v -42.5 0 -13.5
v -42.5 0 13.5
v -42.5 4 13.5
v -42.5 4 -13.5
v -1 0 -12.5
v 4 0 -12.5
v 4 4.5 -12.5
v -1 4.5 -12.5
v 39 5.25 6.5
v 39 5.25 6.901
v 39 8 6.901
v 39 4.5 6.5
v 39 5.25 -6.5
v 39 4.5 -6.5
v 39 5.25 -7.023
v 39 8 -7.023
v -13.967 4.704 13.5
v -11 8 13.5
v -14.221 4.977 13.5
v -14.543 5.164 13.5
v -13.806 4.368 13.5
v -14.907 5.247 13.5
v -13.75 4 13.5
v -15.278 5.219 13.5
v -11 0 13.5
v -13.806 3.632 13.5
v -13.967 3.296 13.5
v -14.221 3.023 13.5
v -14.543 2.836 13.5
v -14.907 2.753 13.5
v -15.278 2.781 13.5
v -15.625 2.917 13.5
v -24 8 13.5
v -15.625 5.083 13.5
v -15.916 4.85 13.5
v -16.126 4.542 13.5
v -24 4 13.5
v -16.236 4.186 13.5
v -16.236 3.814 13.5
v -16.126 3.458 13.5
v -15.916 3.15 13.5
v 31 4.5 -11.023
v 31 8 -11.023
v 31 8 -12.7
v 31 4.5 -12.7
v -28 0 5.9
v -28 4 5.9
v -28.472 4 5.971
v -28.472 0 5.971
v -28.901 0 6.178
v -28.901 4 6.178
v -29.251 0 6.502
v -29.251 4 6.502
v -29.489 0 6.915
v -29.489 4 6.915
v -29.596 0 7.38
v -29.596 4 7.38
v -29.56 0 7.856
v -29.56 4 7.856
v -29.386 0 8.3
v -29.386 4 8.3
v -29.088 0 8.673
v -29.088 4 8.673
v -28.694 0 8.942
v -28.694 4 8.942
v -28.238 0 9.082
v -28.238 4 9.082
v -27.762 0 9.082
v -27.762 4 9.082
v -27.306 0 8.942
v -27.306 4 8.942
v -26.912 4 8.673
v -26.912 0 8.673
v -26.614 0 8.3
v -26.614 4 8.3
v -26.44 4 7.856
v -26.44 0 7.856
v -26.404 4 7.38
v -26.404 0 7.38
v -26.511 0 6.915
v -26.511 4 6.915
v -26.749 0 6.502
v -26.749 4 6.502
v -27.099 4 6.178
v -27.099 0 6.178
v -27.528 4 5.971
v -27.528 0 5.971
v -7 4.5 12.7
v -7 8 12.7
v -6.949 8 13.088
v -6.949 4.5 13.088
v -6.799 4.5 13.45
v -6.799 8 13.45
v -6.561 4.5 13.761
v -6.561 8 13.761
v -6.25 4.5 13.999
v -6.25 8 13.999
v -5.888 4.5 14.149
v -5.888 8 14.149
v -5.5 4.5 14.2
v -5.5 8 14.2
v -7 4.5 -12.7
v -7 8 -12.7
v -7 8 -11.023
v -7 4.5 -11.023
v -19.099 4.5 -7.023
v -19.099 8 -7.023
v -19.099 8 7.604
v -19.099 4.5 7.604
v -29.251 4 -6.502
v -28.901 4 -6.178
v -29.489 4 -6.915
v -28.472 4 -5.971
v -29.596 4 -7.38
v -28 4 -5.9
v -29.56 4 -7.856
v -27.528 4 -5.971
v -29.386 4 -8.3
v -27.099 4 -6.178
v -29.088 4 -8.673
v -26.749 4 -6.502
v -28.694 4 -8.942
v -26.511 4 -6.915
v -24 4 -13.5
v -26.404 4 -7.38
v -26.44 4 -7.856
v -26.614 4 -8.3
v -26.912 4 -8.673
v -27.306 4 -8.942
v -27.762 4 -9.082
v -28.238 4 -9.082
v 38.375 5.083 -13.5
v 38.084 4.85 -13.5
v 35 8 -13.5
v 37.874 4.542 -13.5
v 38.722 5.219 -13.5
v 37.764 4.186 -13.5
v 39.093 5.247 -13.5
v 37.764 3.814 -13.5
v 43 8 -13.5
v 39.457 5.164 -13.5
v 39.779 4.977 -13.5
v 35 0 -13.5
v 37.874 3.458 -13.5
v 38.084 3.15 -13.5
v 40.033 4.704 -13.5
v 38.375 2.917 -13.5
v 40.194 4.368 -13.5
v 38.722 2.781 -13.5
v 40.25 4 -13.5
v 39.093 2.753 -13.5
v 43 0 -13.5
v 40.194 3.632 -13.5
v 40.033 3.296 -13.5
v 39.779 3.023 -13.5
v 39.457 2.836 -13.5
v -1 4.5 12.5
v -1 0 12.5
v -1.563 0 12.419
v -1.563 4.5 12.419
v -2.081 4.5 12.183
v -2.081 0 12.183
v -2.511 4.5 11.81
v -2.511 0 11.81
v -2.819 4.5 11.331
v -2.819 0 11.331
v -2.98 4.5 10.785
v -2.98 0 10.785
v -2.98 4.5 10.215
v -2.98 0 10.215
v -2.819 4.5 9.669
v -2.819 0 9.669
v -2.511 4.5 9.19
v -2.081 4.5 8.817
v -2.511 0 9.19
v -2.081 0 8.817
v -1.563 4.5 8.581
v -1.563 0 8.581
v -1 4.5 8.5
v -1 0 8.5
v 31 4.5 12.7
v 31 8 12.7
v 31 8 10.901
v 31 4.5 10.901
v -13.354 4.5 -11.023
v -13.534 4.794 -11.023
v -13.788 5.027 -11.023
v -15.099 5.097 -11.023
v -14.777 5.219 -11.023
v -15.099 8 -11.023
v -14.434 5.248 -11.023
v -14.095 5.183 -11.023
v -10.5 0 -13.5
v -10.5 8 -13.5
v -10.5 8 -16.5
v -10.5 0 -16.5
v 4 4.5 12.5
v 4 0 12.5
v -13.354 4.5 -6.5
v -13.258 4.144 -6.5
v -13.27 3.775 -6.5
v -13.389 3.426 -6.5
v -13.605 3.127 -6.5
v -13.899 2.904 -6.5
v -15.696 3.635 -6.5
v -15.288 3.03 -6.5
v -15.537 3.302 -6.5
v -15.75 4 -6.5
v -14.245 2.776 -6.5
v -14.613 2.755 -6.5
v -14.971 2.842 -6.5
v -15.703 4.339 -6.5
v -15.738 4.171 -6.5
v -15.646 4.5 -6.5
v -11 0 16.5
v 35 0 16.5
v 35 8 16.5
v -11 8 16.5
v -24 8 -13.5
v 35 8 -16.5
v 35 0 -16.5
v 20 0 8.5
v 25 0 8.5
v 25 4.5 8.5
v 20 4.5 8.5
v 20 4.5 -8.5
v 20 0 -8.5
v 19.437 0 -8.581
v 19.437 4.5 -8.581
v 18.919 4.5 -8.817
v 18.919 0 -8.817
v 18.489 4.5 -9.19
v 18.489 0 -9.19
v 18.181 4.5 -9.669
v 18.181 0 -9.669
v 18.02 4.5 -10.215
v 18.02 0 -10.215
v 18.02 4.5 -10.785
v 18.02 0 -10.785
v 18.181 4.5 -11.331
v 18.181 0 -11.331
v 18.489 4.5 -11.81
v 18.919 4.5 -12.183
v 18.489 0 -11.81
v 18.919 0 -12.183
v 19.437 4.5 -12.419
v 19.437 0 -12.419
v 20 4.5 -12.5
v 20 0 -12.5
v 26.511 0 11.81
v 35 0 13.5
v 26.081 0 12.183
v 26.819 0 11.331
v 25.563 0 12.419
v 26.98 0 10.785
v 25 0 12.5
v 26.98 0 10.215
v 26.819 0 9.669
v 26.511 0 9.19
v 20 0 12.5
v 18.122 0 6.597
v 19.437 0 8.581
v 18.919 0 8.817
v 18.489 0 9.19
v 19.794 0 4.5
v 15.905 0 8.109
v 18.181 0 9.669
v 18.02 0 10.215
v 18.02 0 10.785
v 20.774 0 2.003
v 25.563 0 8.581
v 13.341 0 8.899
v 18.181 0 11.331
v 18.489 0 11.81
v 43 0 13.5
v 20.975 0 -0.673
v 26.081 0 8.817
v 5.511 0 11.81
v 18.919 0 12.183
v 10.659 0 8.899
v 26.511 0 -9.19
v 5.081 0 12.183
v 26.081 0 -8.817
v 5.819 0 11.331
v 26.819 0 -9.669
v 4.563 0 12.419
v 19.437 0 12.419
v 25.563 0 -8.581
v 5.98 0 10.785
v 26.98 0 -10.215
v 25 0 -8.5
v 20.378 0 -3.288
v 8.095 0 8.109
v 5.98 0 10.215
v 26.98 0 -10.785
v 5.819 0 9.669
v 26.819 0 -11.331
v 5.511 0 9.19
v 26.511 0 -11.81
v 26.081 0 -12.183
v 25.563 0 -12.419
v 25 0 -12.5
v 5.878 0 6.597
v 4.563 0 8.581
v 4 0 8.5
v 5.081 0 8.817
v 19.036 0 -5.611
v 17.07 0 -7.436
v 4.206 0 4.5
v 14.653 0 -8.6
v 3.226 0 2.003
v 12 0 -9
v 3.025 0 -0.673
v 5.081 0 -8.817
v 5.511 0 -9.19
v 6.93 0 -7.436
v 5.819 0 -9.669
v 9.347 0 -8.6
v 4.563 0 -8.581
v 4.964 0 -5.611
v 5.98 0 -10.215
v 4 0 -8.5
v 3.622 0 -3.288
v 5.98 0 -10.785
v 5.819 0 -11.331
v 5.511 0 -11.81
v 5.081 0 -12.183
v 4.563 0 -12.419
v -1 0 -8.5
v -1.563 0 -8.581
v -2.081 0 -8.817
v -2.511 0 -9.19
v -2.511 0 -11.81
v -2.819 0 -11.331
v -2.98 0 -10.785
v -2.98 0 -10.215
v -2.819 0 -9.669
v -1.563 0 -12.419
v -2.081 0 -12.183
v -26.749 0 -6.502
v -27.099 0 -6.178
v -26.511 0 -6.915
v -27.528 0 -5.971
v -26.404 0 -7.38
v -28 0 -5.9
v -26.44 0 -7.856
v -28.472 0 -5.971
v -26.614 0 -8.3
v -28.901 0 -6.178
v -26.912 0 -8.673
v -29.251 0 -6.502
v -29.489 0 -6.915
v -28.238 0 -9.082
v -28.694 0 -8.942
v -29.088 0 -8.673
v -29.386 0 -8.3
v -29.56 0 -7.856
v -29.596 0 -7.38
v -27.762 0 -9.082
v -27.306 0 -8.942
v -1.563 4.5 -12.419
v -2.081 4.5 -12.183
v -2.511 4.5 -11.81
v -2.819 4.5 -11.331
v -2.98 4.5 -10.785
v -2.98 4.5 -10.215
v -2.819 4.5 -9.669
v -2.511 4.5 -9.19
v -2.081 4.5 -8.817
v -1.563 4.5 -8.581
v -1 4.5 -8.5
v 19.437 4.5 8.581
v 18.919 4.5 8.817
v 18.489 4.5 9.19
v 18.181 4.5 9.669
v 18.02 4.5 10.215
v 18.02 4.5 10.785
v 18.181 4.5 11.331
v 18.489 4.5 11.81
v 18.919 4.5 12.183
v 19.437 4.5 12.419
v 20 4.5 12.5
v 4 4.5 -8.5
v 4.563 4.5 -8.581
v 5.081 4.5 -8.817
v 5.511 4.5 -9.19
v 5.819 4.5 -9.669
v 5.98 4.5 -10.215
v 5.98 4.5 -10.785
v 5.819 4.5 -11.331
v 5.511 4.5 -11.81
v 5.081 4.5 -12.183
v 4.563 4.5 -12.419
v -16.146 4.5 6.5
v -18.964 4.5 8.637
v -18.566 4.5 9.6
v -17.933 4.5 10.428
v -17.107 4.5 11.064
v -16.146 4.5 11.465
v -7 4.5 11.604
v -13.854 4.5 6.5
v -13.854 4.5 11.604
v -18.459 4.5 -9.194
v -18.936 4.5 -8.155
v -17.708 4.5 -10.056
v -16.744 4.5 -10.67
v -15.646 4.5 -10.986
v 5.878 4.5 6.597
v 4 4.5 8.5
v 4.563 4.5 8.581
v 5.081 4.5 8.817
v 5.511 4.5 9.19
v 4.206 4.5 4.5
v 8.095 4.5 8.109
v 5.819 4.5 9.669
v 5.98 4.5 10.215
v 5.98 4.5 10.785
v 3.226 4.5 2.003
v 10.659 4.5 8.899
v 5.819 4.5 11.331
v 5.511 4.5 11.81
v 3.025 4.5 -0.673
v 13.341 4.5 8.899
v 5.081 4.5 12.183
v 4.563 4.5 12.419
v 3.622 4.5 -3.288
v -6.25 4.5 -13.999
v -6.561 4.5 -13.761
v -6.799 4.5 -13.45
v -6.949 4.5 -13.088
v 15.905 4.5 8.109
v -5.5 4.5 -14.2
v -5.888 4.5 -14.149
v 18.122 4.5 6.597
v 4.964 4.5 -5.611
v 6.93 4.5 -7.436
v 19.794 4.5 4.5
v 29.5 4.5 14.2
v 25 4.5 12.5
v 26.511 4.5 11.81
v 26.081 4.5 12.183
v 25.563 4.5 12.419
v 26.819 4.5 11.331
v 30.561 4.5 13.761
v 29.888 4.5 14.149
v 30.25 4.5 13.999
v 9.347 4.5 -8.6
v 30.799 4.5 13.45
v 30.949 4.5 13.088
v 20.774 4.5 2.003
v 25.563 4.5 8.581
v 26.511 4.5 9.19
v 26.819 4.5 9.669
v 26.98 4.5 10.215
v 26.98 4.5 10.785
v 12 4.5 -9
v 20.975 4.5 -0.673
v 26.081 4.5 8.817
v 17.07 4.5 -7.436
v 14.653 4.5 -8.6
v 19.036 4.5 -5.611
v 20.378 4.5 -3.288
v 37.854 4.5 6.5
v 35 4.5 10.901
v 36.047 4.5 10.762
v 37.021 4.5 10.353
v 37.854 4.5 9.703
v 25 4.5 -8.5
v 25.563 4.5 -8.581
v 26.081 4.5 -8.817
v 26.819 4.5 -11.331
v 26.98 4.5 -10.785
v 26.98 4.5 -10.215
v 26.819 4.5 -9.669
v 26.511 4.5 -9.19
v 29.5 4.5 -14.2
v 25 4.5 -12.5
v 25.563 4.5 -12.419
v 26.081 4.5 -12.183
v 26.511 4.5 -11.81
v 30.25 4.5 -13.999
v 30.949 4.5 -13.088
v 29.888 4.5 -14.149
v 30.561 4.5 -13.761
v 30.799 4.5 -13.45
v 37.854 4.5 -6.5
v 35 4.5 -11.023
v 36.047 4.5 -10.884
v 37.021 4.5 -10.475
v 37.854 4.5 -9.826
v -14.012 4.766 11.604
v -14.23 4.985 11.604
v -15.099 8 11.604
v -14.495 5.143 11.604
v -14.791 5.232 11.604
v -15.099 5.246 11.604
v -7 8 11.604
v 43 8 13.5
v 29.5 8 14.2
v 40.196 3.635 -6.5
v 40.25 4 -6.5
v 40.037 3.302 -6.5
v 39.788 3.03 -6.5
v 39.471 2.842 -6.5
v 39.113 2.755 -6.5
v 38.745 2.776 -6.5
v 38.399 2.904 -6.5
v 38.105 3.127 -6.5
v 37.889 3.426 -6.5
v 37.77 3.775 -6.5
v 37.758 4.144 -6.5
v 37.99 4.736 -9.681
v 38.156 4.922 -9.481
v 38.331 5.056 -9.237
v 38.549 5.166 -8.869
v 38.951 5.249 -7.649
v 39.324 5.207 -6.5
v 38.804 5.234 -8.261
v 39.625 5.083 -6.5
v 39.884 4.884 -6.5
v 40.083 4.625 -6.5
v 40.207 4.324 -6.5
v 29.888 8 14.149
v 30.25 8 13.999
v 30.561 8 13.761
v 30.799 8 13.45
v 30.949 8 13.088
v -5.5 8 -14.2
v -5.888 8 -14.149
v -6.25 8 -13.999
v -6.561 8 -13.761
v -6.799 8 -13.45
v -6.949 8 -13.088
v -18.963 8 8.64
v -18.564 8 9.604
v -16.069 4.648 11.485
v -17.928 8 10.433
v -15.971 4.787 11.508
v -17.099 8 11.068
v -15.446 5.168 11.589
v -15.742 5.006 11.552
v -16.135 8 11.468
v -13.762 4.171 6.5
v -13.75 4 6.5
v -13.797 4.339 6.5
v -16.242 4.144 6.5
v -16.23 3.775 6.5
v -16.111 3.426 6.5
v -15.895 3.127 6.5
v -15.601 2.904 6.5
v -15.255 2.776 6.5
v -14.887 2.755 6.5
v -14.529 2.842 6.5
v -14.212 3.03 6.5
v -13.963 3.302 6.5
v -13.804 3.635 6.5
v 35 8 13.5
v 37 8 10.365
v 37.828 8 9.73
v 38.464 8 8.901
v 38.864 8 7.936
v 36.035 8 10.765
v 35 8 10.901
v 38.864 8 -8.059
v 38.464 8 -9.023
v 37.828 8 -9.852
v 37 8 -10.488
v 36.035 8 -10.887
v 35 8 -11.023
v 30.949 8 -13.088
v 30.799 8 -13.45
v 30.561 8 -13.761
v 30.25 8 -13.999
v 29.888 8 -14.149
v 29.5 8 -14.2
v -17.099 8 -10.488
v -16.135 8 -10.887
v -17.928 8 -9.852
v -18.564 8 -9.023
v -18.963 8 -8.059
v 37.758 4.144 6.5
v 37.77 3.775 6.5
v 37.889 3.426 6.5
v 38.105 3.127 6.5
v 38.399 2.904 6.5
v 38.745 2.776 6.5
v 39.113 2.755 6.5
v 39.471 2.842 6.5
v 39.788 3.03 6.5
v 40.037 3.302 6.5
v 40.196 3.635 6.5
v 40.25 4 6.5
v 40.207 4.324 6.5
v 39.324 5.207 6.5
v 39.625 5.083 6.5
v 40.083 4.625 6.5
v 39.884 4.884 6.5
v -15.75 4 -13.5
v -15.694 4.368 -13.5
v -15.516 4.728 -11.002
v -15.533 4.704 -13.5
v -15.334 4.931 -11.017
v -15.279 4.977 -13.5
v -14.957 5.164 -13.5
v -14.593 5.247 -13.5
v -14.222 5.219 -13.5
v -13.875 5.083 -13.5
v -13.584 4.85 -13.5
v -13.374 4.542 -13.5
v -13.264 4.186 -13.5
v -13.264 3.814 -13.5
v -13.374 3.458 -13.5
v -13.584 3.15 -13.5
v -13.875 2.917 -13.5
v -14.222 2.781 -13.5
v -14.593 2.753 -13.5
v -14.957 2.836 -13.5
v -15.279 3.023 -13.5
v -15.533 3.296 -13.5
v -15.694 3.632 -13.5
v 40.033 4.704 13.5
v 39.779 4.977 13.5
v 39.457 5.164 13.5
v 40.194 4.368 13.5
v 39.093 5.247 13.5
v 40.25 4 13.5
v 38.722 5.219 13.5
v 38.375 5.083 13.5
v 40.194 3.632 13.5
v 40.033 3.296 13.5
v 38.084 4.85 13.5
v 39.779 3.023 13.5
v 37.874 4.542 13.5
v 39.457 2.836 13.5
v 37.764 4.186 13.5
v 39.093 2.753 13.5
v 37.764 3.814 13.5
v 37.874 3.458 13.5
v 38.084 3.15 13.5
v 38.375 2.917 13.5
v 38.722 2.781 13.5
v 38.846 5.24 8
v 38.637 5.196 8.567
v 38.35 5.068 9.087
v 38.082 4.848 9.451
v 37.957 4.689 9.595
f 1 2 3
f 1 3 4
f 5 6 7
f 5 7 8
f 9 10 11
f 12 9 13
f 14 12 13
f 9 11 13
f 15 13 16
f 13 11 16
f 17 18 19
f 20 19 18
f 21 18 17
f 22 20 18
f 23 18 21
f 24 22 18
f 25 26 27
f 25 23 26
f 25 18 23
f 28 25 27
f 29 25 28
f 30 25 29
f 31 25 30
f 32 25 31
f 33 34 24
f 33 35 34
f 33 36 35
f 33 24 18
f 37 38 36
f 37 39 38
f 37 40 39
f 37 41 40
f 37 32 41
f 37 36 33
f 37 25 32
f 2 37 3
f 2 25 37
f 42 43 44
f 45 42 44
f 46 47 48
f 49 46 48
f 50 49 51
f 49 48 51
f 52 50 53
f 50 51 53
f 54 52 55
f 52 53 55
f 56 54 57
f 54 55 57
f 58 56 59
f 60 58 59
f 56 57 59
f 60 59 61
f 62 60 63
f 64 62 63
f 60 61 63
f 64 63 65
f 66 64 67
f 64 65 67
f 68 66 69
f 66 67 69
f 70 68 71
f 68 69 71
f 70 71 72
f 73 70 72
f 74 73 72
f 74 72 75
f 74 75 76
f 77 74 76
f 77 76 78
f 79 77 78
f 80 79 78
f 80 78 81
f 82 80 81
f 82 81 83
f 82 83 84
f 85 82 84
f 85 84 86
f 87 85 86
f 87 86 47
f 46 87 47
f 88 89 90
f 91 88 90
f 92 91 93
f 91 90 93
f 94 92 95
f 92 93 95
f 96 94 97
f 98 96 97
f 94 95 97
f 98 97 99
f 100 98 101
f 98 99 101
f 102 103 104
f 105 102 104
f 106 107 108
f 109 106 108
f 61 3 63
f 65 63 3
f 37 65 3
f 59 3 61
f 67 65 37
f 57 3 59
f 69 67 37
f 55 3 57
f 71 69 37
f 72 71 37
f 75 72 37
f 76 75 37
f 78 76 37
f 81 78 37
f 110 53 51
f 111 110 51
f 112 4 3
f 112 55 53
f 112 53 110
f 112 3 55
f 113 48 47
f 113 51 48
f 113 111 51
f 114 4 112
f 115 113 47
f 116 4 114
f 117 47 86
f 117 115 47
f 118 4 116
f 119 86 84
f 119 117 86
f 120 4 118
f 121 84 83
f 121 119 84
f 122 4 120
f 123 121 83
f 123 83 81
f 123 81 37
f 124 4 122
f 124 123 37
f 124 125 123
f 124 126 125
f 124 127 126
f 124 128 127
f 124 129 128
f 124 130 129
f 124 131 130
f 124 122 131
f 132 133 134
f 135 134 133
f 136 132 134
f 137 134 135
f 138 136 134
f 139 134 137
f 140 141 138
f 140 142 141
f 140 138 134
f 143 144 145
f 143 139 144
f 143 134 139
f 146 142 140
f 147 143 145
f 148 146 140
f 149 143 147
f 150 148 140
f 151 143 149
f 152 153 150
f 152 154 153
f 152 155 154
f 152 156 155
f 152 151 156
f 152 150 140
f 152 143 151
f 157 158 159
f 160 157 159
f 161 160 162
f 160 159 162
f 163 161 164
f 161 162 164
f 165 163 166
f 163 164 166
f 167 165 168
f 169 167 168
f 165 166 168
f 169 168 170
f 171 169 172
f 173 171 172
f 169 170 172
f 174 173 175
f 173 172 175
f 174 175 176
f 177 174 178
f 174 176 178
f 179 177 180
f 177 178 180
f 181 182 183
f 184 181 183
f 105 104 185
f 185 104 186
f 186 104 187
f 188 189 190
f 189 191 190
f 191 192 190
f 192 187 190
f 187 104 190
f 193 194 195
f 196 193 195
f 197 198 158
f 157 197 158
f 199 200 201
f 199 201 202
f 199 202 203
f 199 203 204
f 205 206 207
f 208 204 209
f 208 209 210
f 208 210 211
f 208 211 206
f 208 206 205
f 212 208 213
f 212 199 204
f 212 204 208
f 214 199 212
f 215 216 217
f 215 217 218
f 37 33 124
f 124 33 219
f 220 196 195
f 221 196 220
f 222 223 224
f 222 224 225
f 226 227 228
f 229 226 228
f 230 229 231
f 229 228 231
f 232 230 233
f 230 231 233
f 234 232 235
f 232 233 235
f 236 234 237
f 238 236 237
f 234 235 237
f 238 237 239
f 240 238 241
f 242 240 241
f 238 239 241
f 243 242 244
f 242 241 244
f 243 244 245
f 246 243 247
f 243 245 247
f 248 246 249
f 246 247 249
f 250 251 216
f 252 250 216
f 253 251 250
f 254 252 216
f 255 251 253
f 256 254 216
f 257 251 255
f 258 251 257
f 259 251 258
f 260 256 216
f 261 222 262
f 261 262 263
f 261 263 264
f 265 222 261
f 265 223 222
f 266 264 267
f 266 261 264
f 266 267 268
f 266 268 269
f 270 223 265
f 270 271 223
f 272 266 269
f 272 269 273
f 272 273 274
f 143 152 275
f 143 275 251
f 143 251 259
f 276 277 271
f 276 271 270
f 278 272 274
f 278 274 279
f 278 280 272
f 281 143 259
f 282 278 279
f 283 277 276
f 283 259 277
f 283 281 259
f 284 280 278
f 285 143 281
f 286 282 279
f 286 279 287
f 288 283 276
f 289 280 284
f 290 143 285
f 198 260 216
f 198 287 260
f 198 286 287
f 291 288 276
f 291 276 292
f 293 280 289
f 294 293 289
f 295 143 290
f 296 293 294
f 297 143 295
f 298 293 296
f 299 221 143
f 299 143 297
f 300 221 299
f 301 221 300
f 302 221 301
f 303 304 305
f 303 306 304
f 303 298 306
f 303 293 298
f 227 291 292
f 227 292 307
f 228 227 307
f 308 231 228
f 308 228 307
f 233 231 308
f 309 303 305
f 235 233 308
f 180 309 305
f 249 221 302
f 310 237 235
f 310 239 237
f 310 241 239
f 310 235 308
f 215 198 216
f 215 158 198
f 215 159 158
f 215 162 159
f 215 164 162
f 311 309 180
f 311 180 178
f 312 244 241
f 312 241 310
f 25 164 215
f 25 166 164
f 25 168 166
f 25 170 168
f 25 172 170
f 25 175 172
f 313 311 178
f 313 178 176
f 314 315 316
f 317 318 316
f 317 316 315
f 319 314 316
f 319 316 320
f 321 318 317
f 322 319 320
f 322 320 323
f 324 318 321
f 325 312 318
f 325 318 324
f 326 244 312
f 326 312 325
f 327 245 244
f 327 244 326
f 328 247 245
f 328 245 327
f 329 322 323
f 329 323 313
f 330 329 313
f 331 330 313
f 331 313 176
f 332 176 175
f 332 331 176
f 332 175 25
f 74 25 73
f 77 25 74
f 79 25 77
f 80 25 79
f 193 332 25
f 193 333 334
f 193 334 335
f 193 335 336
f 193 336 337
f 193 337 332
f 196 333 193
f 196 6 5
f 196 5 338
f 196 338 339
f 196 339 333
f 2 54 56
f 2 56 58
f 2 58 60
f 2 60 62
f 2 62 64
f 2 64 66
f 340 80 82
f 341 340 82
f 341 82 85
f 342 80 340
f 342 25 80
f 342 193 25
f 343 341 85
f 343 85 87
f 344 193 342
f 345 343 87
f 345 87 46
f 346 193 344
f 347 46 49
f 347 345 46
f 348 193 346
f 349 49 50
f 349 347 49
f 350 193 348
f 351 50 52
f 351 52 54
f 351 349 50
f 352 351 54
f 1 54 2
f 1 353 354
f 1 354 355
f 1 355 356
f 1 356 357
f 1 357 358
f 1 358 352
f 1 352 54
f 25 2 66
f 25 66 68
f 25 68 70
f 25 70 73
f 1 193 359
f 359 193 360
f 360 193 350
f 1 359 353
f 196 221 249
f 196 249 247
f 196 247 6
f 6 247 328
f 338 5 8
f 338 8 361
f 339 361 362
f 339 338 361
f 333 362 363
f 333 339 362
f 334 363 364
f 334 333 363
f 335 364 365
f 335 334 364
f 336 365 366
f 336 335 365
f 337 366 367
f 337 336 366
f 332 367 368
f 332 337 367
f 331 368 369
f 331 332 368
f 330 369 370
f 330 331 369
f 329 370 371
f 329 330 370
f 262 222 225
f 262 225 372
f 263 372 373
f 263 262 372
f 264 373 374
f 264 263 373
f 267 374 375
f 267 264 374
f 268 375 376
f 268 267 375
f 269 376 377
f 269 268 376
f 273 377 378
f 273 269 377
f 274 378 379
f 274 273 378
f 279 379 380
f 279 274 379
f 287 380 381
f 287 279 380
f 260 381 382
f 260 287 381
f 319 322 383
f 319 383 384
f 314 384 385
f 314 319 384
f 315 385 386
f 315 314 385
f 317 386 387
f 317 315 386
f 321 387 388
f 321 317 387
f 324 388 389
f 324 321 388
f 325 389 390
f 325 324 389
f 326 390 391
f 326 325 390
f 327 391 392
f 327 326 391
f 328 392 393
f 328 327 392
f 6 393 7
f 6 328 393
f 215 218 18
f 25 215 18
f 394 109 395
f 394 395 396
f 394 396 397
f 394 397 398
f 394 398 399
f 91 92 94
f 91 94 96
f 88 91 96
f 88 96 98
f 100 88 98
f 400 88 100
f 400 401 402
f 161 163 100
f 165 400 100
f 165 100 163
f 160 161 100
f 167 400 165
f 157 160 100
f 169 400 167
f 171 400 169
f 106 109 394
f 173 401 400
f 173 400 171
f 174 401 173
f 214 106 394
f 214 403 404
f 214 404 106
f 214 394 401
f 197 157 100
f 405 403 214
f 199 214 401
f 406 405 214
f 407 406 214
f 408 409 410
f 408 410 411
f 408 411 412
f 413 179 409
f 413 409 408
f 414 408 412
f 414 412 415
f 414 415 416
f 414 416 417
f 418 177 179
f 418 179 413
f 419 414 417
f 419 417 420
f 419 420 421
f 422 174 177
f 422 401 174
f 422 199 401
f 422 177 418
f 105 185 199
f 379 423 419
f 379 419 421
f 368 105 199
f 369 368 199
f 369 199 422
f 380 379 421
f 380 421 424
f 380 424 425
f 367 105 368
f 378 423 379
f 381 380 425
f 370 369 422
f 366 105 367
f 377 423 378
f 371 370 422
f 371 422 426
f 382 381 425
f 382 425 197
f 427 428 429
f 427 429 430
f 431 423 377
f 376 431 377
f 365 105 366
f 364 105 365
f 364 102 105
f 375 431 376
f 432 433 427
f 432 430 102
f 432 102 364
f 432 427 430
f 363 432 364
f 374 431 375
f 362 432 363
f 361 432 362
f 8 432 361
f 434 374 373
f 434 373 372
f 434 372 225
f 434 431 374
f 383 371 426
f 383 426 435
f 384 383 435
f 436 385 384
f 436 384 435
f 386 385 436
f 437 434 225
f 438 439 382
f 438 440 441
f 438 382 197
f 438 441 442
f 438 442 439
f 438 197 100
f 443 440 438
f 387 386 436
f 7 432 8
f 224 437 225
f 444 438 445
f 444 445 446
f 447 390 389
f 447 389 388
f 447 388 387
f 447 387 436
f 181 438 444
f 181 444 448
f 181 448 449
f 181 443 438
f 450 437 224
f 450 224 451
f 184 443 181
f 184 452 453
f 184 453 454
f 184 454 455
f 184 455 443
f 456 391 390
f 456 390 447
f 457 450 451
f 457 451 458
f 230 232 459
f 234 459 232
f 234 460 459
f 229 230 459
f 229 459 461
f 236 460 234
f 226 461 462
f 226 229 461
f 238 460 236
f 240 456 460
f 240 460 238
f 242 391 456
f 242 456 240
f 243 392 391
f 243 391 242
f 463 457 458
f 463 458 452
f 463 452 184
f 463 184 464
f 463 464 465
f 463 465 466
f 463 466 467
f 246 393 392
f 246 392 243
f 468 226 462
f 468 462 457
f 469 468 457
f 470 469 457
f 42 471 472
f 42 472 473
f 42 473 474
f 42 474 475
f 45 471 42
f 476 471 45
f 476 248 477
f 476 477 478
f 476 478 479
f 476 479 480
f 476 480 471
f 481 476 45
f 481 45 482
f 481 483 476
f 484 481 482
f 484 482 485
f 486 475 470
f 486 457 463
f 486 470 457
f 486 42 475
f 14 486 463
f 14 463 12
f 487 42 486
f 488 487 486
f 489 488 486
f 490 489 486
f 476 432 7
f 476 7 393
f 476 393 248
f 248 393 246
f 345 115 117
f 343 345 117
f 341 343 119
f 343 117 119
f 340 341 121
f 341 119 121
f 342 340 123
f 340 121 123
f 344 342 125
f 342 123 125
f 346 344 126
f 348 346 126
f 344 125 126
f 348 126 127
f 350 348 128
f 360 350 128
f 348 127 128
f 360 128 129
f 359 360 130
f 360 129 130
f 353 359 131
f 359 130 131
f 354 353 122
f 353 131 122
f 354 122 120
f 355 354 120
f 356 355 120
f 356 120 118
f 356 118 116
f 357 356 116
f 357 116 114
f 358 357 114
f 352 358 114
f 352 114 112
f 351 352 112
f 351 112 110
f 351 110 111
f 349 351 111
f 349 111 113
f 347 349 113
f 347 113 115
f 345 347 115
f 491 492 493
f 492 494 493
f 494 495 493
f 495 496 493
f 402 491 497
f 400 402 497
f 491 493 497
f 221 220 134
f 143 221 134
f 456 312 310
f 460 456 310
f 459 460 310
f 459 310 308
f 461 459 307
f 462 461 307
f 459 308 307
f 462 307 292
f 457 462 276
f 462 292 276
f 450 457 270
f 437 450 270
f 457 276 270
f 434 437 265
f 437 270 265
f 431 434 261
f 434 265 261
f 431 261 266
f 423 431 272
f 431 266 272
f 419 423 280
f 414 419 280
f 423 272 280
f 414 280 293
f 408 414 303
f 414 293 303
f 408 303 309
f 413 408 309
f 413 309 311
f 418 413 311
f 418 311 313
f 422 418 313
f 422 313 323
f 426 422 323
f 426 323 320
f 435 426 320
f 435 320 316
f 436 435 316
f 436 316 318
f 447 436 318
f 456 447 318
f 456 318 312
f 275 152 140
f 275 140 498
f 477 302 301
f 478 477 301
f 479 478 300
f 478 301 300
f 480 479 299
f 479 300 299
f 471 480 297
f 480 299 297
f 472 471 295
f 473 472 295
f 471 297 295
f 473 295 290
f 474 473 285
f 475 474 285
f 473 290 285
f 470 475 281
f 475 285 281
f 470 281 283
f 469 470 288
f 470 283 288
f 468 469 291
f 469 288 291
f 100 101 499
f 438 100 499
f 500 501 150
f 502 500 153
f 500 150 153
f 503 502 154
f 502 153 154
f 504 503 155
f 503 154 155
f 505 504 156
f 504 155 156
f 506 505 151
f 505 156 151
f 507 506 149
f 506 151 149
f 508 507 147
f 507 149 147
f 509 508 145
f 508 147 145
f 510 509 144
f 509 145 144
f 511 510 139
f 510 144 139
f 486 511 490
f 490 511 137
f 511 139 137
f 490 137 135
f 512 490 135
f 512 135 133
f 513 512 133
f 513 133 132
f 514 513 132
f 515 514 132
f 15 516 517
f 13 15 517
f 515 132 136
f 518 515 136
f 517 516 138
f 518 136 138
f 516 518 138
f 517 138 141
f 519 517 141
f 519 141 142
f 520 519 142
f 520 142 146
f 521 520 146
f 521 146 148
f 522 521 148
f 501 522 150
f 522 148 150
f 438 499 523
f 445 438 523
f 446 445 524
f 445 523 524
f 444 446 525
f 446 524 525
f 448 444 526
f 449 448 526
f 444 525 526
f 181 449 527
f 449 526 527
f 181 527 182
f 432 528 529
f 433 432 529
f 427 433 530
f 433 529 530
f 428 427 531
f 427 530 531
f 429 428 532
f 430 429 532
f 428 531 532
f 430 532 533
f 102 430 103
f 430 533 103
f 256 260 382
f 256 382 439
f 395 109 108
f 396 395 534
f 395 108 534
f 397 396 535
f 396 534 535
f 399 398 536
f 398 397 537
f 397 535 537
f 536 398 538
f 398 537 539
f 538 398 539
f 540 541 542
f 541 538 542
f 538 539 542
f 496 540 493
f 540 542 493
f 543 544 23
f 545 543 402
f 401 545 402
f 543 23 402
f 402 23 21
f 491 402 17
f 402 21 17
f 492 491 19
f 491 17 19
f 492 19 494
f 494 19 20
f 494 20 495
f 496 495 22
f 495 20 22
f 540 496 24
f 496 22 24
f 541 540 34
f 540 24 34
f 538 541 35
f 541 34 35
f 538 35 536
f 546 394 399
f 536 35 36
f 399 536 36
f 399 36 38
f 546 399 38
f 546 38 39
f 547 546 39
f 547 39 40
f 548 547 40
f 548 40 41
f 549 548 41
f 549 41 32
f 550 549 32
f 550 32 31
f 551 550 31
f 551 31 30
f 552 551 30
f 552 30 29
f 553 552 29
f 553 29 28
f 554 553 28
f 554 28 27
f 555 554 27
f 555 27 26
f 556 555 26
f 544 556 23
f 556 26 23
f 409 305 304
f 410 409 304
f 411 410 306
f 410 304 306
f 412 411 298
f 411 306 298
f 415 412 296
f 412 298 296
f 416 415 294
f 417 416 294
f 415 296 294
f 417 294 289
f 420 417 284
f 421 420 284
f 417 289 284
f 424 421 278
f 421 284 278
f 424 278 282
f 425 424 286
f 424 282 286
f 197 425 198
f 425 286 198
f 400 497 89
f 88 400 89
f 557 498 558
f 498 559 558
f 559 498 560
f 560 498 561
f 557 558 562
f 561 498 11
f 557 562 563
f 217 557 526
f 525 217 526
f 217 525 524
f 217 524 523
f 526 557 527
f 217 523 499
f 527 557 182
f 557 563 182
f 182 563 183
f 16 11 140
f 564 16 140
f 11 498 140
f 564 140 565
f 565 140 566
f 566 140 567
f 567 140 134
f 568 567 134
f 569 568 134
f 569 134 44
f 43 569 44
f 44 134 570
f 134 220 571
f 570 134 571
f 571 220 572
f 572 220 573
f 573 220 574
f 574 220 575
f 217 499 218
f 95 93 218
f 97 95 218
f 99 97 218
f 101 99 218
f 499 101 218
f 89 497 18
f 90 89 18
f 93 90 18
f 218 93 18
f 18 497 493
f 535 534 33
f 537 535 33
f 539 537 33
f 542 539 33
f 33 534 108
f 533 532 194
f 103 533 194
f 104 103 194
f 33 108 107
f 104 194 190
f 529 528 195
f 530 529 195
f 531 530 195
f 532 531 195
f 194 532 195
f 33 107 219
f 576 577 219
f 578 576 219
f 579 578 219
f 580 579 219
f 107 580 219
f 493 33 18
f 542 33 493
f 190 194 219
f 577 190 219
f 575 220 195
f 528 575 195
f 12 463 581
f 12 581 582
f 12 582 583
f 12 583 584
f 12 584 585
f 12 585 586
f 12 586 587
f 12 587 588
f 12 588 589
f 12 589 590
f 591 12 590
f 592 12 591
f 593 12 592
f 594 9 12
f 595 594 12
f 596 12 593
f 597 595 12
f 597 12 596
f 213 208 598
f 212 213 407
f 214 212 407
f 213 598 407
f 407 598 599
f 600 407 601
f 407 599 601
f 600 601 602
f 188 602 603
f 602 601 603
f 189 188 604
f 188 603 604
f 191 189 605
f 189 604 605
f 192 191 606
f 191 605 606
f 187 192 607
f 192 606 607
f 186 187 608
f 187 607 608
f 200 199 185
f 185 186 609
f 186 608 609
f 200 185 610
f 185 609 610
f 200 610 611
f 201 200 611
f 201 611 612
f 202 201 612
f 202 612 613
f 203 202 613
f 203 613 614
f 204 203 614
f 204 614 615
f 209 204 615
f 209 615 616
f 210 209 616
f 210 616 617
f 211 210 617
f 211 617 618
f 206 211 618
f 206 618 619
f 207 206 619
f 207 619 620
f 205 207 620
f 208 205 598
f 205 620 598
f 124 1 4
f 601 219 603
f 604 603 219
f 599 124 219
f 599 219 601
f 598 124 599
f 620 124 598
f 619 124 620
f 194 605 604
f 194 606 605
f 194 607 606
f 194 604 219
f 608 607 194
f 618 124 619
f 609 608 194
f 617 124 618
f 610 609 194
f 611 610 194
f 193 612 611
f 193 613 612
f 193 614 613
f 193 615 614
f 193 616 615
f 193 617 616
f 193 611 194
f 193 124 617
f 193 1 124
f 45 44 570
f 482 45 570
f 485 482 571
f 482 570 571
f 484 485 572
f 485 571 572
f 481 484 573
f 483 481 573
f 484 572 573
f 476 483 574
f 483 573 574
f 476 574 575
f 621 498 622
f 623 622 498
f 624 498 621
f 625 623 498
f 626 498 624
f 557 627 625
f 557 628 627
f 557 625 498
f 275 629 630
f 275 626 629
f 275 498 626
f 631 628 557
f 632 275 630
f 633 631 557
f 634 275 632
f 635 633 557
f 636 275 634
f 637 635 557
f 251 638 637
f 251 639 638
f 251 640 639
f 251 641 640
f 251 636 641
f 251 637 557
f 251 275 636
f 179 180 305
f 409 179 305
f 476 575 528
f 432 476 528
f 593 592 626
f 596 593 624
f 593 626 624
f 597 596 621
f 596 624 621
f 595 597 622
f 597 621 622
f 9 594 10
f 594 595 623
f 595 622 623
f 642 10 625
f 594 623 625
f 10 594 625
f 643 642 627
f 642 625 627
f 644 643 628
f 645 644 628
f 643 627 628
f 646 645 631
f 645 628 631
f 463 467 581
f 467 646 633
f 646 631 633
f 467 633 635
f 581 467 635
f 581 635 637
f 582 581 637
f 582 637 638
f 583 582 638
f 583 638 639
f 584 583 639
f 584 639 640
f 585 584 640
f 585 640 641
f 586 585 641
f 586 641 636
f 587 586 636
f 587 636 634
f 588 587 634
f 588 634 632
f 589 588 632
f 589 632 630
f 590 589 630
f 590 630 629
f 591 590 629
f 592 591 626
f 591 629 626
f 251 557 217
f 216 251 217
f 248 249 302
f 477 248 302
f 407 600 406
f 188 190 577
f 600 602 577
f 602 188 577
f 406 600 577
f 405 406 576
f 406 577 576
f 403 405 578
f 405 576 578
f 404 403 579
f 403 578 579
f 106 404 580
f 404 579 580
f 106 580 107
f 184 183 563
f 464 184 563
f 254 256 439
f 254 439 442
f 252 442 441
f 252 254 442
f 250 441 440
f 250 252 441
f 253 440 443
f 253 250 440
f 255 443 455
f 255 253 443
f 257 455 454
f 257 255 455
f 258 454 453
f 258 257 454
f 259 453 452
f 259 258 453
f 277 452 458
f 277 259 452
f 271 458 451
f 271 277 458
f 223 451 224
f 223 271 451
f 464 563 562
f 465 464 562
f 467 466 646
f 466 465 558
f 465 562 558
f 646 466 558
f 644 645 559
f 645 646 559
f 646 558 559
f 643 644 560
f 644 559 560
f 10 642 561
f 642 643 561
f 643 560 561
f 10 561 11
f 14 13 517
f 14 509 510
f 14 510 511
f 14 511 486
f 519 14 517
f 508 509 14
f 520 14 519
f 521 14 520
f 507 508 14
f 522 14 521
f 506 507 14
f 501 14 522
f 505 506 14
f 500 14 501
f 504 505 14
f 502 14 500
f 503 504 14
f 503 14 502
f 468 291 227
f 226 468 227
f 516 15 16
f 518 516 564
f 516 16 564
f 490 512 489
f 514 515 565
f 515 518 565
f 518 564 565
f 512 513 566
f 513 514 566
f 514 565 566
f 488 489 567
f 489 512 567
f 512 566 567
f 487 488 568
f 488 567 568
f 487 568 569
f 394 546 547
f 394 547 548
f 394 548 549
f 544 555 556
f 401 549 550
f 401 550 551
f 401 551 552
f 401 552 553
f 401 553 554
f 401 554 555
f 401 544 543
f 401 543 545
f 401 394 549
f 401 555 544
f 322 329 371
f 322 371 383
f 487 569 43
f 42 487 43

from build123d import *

# Parameters (mm, degrees)
EXTRUDE_1_DEPTH      = 8
SKETCH_2_W           = 18.5
SKETCH_2_H           = 27
CUT_EXTRUDE_1_DEPTH  = 4
SKETCH_3_R           = 1.6
CUT_EXTRUDE_2_DEPTH  = 5
SKETCH_4_R           = 9
CUT_EXTRUDE_3_DEPTH  = 9
CUT_EXTRUDE_4_DEPTH  = 3.5
SKETCH_6_R           = 1.25
CUT_EXTRUDE_8_DEPTH  = 7
SKETCH_7_R           = 1.25
CUT_EXTRUDE_9_DEPTH  = 7
SKETCH_8_R           = 1.25
CUT_EXTRUDE_10_DEPTH = 7
SKETCH_9_R           = 1.25
CUT_EXTRUDE_11_DEPTH = 7


with BuildPart() as part:
    # Эскиз1 → Бобышка-Вытянуть1 (new body)
    with BuildSketch(Plane(origin=(0, 0, 0), x_dir=(1, 0, 0), z_dir=(0, 1, 0))):
        Polygon((43, 13.5), (43, -13.5), (35, -13.5), (35, -16.5), (-11, -16.5), (-11, -13.5), (-42.5, -13.5), (-42.5, 13.5), (-10.5, 13.5), (-10.5, 16.5), (35, 16.5), (35, 13.5), align=None)
    extrude(amount=EXTRUDE_1_DEPTH)

    # Эскиз2 → Вырез-Вытянуть1 (cut)
    with BuildSketch(Plane(origin=(0, 8, 0), x_dir=(1, 0, 0), z_dir=(0, 1, 0))):
        with Locations((-33.25, 0)):
            Rectangle(SKETCH_2_W, SKETCH_2_H)
    extrude(amount=-CUT_EXTRUDE_1_DEPTH, mode=Mode.SUBTRACT)

    # Эскиз3 → Вырез-Вытянуть2 (cut, through all)
    with BuildSketch(Plane(origin=(0, 4, 0), x_dir=(1, 0, 0), z_dir=(0, 1, 0))):
        with Locations(Location((-28, 7.5, 0), (0, 0, 270))):  # turned: the seam where the file's is
            Circle(SKETCH_3_R)
        with Locations(Location((-28, -7.5, 0), (0, 0, 90))):  # turned: the seam where the file's is
            Circle(SKETCH_3_R)
    extrude(amount=-CUT_EXTRUDE_2_DEPTH, mode=Mode.SUBTRACT)

    # Эскиз4 → Вырез-Вытянуть3 (cut, through all)
    with BuildSketch(Plane.XZ):
        with Locations(Location((12, 0, 0), (0, 0, 270))):  # turned: the seam where the file's is
            Circle(SKETCH_4_R)
        with BuildLine():
            Line((20, 12.5), (25, 12.5))
            ThreePointArc((25, 12.5), (27, 10.5), (25, 8.5))
            Line((25, 8.5), (20, 8.5))
            ThreePointArc((20, 8.5), (18, 10.5), (20, 12.5))
        make_face()
        with BuildLine():
            Line((4, 12.5), (-1, 12.5))
            ThreePointArc((-1, 12.5), (-3, 10.5), (-1, 8.5))
            Line((-1, 8.5), (4, 8.5))
            ThreePointArc((4, 8.5), (6, 10.5), (4, 12.5))
        make_face()
        with BuildLine():
            Line((20, -12.5), (25, -12.5))
            ThreePointArc((25, -12.5), (27, -10.5), (25, -8.5))
            Line((25, -8.5), (20, -8.5))
            ThreePointArc((20, -8.5), (18, -10.5), (20, -12.5))
        make_face()
        with BuildLine():
            Line((4, -12.5), (-1, -12.5))
            ThreePointArc((-1, -12.5), (-3, -10.5), (-1, -8.5))
            Line((-1, -8.5), (4, -8.5))
            ThreePointArc((4, -8.5), (6, -10.5), (4, -12.5))
        make_face()
    extrude(amount=-CUT_EXTRUDE_3_DEPTH, mode=Mode.SUBTRACT)

    # Эскиз5 → Вырез-Вытянуть4 (cut)
    with BuildSketch(Plane(origin=(0, 8, 0), x_dir=(1, 0, 0), z_dir=(0, 1, 0))):
        with BuildLine():
            Line((-19.099474061, 7.023433075), (-19.099474061, -7.604302917))
            ThreePointArc((-19.099474061, -7.604302917), (-17.927901185, -10.432730042), (-15.099474061, -11.604302917))
            Line((-15.099474061, -11.604302917), (-7, -11.604302917))
            Line((-7, -11.604302917), (-7, -12.7))
            ThreePointArc((-7, -12.7), (-6.560660172, -13.760660172), (-5.5, -14.2))
            Line((-5.5, -14.2), (29.5, -14.2))
            ThreePointArc((29.5, -14.2), (30.560660172, -13.760660172), (31, -12.7))
            Line((31, -12.7), (31, -10.901181177))
            Line((31, -10.901181177), (35, -10.901181177))
            ThreePointArc((35, -10.901181177), (37.828427125, -9.729608302), (39, -6.901181177))
            Line((39, -6.901181177), (39, 7.023433075))
            ThreePointArc((39, 7.023433075), (37.828427125, 9.8518602), (35, 11.023433075))
            Line((35, 11.023433075), (31, 11.023433075))
            Line((31, 11.023433075), (31, 12.7))
            ThreePointArc((31, 12.7), (30.560660172, 13.760660172), (29.5, 14.2))
            Line((29.5, 14.2), (-5.5, 14.2))
            ThreePointArc((-5.5, 14.2), (-6.560660172, 13.760660172), (-7, 12.7))
            Line((-7, 12.7), (-7, 11.023433075))
            Line((-7, 11.023433075), (-15.099474061, 11.023433075))
            ThreePointArc((-15.099474061, 11.023433075), (-17.927901185, 9.8518602), (-19.099474061, 7.023433075))
        make_face()
    extrude(amount=-CUT_EXTRUDE_4_DEPTH, mode=Mode.SUBTRACT)

    # Эскиз6 → Вырез-Вытянуть8 (cut)
    with BuildSketch(Plane.XY.offset(13.5)):
        with Locations((39, 4)):
            Circle(SKETCH_6_R)
    extrude(amount=-CUT_EXTRUDE_8_DEPTH, mode=Mode.SUBTRACT)

    # Эскиз7 → Вырез-Вытянуть9 (cut)
    with BuildSketch(Plane.XY.offset(13.5)):
        with Locations((-15, 4)):
            Circle(SKETCH_7_R)
    extrude(amount=-CUT_EXTRUDE_9_DEPTH, mode=Mode.SUBTRACT)

    # Эскиз8 → Вырез-Вытянуть10 (cut)
    with BuildSketch(Plane(origin=(0, 0, -13.5), x_dir=(-1, 0, 0), z_dir=(0, 0, -1))):
        with Locations(Location((-39, 4, 0), (0, 0, 180))):  # turned: the seam where the file's is
            Circle(SKETCH_8_R)
    extrude(amount=-CUT_EXTRUDE_10_DEPTH, mode=Mode.SUBTRACT)

    # Эскиз9 → Вырез-Вытянуть11 (cut)
    with BuildSketch(Plane(origin=(0, 0, -13.5), x_dir=(-1, 0, 0), z_dir=(0, 0, -1))):
        with Locations((14.5, 4)):
            Circle(SKETCH_9_R)
    extrude(amount=-CUT_EXTRUDE_11_DEPTH, mode=Mode.SUBTRACT)


solid = part.part
